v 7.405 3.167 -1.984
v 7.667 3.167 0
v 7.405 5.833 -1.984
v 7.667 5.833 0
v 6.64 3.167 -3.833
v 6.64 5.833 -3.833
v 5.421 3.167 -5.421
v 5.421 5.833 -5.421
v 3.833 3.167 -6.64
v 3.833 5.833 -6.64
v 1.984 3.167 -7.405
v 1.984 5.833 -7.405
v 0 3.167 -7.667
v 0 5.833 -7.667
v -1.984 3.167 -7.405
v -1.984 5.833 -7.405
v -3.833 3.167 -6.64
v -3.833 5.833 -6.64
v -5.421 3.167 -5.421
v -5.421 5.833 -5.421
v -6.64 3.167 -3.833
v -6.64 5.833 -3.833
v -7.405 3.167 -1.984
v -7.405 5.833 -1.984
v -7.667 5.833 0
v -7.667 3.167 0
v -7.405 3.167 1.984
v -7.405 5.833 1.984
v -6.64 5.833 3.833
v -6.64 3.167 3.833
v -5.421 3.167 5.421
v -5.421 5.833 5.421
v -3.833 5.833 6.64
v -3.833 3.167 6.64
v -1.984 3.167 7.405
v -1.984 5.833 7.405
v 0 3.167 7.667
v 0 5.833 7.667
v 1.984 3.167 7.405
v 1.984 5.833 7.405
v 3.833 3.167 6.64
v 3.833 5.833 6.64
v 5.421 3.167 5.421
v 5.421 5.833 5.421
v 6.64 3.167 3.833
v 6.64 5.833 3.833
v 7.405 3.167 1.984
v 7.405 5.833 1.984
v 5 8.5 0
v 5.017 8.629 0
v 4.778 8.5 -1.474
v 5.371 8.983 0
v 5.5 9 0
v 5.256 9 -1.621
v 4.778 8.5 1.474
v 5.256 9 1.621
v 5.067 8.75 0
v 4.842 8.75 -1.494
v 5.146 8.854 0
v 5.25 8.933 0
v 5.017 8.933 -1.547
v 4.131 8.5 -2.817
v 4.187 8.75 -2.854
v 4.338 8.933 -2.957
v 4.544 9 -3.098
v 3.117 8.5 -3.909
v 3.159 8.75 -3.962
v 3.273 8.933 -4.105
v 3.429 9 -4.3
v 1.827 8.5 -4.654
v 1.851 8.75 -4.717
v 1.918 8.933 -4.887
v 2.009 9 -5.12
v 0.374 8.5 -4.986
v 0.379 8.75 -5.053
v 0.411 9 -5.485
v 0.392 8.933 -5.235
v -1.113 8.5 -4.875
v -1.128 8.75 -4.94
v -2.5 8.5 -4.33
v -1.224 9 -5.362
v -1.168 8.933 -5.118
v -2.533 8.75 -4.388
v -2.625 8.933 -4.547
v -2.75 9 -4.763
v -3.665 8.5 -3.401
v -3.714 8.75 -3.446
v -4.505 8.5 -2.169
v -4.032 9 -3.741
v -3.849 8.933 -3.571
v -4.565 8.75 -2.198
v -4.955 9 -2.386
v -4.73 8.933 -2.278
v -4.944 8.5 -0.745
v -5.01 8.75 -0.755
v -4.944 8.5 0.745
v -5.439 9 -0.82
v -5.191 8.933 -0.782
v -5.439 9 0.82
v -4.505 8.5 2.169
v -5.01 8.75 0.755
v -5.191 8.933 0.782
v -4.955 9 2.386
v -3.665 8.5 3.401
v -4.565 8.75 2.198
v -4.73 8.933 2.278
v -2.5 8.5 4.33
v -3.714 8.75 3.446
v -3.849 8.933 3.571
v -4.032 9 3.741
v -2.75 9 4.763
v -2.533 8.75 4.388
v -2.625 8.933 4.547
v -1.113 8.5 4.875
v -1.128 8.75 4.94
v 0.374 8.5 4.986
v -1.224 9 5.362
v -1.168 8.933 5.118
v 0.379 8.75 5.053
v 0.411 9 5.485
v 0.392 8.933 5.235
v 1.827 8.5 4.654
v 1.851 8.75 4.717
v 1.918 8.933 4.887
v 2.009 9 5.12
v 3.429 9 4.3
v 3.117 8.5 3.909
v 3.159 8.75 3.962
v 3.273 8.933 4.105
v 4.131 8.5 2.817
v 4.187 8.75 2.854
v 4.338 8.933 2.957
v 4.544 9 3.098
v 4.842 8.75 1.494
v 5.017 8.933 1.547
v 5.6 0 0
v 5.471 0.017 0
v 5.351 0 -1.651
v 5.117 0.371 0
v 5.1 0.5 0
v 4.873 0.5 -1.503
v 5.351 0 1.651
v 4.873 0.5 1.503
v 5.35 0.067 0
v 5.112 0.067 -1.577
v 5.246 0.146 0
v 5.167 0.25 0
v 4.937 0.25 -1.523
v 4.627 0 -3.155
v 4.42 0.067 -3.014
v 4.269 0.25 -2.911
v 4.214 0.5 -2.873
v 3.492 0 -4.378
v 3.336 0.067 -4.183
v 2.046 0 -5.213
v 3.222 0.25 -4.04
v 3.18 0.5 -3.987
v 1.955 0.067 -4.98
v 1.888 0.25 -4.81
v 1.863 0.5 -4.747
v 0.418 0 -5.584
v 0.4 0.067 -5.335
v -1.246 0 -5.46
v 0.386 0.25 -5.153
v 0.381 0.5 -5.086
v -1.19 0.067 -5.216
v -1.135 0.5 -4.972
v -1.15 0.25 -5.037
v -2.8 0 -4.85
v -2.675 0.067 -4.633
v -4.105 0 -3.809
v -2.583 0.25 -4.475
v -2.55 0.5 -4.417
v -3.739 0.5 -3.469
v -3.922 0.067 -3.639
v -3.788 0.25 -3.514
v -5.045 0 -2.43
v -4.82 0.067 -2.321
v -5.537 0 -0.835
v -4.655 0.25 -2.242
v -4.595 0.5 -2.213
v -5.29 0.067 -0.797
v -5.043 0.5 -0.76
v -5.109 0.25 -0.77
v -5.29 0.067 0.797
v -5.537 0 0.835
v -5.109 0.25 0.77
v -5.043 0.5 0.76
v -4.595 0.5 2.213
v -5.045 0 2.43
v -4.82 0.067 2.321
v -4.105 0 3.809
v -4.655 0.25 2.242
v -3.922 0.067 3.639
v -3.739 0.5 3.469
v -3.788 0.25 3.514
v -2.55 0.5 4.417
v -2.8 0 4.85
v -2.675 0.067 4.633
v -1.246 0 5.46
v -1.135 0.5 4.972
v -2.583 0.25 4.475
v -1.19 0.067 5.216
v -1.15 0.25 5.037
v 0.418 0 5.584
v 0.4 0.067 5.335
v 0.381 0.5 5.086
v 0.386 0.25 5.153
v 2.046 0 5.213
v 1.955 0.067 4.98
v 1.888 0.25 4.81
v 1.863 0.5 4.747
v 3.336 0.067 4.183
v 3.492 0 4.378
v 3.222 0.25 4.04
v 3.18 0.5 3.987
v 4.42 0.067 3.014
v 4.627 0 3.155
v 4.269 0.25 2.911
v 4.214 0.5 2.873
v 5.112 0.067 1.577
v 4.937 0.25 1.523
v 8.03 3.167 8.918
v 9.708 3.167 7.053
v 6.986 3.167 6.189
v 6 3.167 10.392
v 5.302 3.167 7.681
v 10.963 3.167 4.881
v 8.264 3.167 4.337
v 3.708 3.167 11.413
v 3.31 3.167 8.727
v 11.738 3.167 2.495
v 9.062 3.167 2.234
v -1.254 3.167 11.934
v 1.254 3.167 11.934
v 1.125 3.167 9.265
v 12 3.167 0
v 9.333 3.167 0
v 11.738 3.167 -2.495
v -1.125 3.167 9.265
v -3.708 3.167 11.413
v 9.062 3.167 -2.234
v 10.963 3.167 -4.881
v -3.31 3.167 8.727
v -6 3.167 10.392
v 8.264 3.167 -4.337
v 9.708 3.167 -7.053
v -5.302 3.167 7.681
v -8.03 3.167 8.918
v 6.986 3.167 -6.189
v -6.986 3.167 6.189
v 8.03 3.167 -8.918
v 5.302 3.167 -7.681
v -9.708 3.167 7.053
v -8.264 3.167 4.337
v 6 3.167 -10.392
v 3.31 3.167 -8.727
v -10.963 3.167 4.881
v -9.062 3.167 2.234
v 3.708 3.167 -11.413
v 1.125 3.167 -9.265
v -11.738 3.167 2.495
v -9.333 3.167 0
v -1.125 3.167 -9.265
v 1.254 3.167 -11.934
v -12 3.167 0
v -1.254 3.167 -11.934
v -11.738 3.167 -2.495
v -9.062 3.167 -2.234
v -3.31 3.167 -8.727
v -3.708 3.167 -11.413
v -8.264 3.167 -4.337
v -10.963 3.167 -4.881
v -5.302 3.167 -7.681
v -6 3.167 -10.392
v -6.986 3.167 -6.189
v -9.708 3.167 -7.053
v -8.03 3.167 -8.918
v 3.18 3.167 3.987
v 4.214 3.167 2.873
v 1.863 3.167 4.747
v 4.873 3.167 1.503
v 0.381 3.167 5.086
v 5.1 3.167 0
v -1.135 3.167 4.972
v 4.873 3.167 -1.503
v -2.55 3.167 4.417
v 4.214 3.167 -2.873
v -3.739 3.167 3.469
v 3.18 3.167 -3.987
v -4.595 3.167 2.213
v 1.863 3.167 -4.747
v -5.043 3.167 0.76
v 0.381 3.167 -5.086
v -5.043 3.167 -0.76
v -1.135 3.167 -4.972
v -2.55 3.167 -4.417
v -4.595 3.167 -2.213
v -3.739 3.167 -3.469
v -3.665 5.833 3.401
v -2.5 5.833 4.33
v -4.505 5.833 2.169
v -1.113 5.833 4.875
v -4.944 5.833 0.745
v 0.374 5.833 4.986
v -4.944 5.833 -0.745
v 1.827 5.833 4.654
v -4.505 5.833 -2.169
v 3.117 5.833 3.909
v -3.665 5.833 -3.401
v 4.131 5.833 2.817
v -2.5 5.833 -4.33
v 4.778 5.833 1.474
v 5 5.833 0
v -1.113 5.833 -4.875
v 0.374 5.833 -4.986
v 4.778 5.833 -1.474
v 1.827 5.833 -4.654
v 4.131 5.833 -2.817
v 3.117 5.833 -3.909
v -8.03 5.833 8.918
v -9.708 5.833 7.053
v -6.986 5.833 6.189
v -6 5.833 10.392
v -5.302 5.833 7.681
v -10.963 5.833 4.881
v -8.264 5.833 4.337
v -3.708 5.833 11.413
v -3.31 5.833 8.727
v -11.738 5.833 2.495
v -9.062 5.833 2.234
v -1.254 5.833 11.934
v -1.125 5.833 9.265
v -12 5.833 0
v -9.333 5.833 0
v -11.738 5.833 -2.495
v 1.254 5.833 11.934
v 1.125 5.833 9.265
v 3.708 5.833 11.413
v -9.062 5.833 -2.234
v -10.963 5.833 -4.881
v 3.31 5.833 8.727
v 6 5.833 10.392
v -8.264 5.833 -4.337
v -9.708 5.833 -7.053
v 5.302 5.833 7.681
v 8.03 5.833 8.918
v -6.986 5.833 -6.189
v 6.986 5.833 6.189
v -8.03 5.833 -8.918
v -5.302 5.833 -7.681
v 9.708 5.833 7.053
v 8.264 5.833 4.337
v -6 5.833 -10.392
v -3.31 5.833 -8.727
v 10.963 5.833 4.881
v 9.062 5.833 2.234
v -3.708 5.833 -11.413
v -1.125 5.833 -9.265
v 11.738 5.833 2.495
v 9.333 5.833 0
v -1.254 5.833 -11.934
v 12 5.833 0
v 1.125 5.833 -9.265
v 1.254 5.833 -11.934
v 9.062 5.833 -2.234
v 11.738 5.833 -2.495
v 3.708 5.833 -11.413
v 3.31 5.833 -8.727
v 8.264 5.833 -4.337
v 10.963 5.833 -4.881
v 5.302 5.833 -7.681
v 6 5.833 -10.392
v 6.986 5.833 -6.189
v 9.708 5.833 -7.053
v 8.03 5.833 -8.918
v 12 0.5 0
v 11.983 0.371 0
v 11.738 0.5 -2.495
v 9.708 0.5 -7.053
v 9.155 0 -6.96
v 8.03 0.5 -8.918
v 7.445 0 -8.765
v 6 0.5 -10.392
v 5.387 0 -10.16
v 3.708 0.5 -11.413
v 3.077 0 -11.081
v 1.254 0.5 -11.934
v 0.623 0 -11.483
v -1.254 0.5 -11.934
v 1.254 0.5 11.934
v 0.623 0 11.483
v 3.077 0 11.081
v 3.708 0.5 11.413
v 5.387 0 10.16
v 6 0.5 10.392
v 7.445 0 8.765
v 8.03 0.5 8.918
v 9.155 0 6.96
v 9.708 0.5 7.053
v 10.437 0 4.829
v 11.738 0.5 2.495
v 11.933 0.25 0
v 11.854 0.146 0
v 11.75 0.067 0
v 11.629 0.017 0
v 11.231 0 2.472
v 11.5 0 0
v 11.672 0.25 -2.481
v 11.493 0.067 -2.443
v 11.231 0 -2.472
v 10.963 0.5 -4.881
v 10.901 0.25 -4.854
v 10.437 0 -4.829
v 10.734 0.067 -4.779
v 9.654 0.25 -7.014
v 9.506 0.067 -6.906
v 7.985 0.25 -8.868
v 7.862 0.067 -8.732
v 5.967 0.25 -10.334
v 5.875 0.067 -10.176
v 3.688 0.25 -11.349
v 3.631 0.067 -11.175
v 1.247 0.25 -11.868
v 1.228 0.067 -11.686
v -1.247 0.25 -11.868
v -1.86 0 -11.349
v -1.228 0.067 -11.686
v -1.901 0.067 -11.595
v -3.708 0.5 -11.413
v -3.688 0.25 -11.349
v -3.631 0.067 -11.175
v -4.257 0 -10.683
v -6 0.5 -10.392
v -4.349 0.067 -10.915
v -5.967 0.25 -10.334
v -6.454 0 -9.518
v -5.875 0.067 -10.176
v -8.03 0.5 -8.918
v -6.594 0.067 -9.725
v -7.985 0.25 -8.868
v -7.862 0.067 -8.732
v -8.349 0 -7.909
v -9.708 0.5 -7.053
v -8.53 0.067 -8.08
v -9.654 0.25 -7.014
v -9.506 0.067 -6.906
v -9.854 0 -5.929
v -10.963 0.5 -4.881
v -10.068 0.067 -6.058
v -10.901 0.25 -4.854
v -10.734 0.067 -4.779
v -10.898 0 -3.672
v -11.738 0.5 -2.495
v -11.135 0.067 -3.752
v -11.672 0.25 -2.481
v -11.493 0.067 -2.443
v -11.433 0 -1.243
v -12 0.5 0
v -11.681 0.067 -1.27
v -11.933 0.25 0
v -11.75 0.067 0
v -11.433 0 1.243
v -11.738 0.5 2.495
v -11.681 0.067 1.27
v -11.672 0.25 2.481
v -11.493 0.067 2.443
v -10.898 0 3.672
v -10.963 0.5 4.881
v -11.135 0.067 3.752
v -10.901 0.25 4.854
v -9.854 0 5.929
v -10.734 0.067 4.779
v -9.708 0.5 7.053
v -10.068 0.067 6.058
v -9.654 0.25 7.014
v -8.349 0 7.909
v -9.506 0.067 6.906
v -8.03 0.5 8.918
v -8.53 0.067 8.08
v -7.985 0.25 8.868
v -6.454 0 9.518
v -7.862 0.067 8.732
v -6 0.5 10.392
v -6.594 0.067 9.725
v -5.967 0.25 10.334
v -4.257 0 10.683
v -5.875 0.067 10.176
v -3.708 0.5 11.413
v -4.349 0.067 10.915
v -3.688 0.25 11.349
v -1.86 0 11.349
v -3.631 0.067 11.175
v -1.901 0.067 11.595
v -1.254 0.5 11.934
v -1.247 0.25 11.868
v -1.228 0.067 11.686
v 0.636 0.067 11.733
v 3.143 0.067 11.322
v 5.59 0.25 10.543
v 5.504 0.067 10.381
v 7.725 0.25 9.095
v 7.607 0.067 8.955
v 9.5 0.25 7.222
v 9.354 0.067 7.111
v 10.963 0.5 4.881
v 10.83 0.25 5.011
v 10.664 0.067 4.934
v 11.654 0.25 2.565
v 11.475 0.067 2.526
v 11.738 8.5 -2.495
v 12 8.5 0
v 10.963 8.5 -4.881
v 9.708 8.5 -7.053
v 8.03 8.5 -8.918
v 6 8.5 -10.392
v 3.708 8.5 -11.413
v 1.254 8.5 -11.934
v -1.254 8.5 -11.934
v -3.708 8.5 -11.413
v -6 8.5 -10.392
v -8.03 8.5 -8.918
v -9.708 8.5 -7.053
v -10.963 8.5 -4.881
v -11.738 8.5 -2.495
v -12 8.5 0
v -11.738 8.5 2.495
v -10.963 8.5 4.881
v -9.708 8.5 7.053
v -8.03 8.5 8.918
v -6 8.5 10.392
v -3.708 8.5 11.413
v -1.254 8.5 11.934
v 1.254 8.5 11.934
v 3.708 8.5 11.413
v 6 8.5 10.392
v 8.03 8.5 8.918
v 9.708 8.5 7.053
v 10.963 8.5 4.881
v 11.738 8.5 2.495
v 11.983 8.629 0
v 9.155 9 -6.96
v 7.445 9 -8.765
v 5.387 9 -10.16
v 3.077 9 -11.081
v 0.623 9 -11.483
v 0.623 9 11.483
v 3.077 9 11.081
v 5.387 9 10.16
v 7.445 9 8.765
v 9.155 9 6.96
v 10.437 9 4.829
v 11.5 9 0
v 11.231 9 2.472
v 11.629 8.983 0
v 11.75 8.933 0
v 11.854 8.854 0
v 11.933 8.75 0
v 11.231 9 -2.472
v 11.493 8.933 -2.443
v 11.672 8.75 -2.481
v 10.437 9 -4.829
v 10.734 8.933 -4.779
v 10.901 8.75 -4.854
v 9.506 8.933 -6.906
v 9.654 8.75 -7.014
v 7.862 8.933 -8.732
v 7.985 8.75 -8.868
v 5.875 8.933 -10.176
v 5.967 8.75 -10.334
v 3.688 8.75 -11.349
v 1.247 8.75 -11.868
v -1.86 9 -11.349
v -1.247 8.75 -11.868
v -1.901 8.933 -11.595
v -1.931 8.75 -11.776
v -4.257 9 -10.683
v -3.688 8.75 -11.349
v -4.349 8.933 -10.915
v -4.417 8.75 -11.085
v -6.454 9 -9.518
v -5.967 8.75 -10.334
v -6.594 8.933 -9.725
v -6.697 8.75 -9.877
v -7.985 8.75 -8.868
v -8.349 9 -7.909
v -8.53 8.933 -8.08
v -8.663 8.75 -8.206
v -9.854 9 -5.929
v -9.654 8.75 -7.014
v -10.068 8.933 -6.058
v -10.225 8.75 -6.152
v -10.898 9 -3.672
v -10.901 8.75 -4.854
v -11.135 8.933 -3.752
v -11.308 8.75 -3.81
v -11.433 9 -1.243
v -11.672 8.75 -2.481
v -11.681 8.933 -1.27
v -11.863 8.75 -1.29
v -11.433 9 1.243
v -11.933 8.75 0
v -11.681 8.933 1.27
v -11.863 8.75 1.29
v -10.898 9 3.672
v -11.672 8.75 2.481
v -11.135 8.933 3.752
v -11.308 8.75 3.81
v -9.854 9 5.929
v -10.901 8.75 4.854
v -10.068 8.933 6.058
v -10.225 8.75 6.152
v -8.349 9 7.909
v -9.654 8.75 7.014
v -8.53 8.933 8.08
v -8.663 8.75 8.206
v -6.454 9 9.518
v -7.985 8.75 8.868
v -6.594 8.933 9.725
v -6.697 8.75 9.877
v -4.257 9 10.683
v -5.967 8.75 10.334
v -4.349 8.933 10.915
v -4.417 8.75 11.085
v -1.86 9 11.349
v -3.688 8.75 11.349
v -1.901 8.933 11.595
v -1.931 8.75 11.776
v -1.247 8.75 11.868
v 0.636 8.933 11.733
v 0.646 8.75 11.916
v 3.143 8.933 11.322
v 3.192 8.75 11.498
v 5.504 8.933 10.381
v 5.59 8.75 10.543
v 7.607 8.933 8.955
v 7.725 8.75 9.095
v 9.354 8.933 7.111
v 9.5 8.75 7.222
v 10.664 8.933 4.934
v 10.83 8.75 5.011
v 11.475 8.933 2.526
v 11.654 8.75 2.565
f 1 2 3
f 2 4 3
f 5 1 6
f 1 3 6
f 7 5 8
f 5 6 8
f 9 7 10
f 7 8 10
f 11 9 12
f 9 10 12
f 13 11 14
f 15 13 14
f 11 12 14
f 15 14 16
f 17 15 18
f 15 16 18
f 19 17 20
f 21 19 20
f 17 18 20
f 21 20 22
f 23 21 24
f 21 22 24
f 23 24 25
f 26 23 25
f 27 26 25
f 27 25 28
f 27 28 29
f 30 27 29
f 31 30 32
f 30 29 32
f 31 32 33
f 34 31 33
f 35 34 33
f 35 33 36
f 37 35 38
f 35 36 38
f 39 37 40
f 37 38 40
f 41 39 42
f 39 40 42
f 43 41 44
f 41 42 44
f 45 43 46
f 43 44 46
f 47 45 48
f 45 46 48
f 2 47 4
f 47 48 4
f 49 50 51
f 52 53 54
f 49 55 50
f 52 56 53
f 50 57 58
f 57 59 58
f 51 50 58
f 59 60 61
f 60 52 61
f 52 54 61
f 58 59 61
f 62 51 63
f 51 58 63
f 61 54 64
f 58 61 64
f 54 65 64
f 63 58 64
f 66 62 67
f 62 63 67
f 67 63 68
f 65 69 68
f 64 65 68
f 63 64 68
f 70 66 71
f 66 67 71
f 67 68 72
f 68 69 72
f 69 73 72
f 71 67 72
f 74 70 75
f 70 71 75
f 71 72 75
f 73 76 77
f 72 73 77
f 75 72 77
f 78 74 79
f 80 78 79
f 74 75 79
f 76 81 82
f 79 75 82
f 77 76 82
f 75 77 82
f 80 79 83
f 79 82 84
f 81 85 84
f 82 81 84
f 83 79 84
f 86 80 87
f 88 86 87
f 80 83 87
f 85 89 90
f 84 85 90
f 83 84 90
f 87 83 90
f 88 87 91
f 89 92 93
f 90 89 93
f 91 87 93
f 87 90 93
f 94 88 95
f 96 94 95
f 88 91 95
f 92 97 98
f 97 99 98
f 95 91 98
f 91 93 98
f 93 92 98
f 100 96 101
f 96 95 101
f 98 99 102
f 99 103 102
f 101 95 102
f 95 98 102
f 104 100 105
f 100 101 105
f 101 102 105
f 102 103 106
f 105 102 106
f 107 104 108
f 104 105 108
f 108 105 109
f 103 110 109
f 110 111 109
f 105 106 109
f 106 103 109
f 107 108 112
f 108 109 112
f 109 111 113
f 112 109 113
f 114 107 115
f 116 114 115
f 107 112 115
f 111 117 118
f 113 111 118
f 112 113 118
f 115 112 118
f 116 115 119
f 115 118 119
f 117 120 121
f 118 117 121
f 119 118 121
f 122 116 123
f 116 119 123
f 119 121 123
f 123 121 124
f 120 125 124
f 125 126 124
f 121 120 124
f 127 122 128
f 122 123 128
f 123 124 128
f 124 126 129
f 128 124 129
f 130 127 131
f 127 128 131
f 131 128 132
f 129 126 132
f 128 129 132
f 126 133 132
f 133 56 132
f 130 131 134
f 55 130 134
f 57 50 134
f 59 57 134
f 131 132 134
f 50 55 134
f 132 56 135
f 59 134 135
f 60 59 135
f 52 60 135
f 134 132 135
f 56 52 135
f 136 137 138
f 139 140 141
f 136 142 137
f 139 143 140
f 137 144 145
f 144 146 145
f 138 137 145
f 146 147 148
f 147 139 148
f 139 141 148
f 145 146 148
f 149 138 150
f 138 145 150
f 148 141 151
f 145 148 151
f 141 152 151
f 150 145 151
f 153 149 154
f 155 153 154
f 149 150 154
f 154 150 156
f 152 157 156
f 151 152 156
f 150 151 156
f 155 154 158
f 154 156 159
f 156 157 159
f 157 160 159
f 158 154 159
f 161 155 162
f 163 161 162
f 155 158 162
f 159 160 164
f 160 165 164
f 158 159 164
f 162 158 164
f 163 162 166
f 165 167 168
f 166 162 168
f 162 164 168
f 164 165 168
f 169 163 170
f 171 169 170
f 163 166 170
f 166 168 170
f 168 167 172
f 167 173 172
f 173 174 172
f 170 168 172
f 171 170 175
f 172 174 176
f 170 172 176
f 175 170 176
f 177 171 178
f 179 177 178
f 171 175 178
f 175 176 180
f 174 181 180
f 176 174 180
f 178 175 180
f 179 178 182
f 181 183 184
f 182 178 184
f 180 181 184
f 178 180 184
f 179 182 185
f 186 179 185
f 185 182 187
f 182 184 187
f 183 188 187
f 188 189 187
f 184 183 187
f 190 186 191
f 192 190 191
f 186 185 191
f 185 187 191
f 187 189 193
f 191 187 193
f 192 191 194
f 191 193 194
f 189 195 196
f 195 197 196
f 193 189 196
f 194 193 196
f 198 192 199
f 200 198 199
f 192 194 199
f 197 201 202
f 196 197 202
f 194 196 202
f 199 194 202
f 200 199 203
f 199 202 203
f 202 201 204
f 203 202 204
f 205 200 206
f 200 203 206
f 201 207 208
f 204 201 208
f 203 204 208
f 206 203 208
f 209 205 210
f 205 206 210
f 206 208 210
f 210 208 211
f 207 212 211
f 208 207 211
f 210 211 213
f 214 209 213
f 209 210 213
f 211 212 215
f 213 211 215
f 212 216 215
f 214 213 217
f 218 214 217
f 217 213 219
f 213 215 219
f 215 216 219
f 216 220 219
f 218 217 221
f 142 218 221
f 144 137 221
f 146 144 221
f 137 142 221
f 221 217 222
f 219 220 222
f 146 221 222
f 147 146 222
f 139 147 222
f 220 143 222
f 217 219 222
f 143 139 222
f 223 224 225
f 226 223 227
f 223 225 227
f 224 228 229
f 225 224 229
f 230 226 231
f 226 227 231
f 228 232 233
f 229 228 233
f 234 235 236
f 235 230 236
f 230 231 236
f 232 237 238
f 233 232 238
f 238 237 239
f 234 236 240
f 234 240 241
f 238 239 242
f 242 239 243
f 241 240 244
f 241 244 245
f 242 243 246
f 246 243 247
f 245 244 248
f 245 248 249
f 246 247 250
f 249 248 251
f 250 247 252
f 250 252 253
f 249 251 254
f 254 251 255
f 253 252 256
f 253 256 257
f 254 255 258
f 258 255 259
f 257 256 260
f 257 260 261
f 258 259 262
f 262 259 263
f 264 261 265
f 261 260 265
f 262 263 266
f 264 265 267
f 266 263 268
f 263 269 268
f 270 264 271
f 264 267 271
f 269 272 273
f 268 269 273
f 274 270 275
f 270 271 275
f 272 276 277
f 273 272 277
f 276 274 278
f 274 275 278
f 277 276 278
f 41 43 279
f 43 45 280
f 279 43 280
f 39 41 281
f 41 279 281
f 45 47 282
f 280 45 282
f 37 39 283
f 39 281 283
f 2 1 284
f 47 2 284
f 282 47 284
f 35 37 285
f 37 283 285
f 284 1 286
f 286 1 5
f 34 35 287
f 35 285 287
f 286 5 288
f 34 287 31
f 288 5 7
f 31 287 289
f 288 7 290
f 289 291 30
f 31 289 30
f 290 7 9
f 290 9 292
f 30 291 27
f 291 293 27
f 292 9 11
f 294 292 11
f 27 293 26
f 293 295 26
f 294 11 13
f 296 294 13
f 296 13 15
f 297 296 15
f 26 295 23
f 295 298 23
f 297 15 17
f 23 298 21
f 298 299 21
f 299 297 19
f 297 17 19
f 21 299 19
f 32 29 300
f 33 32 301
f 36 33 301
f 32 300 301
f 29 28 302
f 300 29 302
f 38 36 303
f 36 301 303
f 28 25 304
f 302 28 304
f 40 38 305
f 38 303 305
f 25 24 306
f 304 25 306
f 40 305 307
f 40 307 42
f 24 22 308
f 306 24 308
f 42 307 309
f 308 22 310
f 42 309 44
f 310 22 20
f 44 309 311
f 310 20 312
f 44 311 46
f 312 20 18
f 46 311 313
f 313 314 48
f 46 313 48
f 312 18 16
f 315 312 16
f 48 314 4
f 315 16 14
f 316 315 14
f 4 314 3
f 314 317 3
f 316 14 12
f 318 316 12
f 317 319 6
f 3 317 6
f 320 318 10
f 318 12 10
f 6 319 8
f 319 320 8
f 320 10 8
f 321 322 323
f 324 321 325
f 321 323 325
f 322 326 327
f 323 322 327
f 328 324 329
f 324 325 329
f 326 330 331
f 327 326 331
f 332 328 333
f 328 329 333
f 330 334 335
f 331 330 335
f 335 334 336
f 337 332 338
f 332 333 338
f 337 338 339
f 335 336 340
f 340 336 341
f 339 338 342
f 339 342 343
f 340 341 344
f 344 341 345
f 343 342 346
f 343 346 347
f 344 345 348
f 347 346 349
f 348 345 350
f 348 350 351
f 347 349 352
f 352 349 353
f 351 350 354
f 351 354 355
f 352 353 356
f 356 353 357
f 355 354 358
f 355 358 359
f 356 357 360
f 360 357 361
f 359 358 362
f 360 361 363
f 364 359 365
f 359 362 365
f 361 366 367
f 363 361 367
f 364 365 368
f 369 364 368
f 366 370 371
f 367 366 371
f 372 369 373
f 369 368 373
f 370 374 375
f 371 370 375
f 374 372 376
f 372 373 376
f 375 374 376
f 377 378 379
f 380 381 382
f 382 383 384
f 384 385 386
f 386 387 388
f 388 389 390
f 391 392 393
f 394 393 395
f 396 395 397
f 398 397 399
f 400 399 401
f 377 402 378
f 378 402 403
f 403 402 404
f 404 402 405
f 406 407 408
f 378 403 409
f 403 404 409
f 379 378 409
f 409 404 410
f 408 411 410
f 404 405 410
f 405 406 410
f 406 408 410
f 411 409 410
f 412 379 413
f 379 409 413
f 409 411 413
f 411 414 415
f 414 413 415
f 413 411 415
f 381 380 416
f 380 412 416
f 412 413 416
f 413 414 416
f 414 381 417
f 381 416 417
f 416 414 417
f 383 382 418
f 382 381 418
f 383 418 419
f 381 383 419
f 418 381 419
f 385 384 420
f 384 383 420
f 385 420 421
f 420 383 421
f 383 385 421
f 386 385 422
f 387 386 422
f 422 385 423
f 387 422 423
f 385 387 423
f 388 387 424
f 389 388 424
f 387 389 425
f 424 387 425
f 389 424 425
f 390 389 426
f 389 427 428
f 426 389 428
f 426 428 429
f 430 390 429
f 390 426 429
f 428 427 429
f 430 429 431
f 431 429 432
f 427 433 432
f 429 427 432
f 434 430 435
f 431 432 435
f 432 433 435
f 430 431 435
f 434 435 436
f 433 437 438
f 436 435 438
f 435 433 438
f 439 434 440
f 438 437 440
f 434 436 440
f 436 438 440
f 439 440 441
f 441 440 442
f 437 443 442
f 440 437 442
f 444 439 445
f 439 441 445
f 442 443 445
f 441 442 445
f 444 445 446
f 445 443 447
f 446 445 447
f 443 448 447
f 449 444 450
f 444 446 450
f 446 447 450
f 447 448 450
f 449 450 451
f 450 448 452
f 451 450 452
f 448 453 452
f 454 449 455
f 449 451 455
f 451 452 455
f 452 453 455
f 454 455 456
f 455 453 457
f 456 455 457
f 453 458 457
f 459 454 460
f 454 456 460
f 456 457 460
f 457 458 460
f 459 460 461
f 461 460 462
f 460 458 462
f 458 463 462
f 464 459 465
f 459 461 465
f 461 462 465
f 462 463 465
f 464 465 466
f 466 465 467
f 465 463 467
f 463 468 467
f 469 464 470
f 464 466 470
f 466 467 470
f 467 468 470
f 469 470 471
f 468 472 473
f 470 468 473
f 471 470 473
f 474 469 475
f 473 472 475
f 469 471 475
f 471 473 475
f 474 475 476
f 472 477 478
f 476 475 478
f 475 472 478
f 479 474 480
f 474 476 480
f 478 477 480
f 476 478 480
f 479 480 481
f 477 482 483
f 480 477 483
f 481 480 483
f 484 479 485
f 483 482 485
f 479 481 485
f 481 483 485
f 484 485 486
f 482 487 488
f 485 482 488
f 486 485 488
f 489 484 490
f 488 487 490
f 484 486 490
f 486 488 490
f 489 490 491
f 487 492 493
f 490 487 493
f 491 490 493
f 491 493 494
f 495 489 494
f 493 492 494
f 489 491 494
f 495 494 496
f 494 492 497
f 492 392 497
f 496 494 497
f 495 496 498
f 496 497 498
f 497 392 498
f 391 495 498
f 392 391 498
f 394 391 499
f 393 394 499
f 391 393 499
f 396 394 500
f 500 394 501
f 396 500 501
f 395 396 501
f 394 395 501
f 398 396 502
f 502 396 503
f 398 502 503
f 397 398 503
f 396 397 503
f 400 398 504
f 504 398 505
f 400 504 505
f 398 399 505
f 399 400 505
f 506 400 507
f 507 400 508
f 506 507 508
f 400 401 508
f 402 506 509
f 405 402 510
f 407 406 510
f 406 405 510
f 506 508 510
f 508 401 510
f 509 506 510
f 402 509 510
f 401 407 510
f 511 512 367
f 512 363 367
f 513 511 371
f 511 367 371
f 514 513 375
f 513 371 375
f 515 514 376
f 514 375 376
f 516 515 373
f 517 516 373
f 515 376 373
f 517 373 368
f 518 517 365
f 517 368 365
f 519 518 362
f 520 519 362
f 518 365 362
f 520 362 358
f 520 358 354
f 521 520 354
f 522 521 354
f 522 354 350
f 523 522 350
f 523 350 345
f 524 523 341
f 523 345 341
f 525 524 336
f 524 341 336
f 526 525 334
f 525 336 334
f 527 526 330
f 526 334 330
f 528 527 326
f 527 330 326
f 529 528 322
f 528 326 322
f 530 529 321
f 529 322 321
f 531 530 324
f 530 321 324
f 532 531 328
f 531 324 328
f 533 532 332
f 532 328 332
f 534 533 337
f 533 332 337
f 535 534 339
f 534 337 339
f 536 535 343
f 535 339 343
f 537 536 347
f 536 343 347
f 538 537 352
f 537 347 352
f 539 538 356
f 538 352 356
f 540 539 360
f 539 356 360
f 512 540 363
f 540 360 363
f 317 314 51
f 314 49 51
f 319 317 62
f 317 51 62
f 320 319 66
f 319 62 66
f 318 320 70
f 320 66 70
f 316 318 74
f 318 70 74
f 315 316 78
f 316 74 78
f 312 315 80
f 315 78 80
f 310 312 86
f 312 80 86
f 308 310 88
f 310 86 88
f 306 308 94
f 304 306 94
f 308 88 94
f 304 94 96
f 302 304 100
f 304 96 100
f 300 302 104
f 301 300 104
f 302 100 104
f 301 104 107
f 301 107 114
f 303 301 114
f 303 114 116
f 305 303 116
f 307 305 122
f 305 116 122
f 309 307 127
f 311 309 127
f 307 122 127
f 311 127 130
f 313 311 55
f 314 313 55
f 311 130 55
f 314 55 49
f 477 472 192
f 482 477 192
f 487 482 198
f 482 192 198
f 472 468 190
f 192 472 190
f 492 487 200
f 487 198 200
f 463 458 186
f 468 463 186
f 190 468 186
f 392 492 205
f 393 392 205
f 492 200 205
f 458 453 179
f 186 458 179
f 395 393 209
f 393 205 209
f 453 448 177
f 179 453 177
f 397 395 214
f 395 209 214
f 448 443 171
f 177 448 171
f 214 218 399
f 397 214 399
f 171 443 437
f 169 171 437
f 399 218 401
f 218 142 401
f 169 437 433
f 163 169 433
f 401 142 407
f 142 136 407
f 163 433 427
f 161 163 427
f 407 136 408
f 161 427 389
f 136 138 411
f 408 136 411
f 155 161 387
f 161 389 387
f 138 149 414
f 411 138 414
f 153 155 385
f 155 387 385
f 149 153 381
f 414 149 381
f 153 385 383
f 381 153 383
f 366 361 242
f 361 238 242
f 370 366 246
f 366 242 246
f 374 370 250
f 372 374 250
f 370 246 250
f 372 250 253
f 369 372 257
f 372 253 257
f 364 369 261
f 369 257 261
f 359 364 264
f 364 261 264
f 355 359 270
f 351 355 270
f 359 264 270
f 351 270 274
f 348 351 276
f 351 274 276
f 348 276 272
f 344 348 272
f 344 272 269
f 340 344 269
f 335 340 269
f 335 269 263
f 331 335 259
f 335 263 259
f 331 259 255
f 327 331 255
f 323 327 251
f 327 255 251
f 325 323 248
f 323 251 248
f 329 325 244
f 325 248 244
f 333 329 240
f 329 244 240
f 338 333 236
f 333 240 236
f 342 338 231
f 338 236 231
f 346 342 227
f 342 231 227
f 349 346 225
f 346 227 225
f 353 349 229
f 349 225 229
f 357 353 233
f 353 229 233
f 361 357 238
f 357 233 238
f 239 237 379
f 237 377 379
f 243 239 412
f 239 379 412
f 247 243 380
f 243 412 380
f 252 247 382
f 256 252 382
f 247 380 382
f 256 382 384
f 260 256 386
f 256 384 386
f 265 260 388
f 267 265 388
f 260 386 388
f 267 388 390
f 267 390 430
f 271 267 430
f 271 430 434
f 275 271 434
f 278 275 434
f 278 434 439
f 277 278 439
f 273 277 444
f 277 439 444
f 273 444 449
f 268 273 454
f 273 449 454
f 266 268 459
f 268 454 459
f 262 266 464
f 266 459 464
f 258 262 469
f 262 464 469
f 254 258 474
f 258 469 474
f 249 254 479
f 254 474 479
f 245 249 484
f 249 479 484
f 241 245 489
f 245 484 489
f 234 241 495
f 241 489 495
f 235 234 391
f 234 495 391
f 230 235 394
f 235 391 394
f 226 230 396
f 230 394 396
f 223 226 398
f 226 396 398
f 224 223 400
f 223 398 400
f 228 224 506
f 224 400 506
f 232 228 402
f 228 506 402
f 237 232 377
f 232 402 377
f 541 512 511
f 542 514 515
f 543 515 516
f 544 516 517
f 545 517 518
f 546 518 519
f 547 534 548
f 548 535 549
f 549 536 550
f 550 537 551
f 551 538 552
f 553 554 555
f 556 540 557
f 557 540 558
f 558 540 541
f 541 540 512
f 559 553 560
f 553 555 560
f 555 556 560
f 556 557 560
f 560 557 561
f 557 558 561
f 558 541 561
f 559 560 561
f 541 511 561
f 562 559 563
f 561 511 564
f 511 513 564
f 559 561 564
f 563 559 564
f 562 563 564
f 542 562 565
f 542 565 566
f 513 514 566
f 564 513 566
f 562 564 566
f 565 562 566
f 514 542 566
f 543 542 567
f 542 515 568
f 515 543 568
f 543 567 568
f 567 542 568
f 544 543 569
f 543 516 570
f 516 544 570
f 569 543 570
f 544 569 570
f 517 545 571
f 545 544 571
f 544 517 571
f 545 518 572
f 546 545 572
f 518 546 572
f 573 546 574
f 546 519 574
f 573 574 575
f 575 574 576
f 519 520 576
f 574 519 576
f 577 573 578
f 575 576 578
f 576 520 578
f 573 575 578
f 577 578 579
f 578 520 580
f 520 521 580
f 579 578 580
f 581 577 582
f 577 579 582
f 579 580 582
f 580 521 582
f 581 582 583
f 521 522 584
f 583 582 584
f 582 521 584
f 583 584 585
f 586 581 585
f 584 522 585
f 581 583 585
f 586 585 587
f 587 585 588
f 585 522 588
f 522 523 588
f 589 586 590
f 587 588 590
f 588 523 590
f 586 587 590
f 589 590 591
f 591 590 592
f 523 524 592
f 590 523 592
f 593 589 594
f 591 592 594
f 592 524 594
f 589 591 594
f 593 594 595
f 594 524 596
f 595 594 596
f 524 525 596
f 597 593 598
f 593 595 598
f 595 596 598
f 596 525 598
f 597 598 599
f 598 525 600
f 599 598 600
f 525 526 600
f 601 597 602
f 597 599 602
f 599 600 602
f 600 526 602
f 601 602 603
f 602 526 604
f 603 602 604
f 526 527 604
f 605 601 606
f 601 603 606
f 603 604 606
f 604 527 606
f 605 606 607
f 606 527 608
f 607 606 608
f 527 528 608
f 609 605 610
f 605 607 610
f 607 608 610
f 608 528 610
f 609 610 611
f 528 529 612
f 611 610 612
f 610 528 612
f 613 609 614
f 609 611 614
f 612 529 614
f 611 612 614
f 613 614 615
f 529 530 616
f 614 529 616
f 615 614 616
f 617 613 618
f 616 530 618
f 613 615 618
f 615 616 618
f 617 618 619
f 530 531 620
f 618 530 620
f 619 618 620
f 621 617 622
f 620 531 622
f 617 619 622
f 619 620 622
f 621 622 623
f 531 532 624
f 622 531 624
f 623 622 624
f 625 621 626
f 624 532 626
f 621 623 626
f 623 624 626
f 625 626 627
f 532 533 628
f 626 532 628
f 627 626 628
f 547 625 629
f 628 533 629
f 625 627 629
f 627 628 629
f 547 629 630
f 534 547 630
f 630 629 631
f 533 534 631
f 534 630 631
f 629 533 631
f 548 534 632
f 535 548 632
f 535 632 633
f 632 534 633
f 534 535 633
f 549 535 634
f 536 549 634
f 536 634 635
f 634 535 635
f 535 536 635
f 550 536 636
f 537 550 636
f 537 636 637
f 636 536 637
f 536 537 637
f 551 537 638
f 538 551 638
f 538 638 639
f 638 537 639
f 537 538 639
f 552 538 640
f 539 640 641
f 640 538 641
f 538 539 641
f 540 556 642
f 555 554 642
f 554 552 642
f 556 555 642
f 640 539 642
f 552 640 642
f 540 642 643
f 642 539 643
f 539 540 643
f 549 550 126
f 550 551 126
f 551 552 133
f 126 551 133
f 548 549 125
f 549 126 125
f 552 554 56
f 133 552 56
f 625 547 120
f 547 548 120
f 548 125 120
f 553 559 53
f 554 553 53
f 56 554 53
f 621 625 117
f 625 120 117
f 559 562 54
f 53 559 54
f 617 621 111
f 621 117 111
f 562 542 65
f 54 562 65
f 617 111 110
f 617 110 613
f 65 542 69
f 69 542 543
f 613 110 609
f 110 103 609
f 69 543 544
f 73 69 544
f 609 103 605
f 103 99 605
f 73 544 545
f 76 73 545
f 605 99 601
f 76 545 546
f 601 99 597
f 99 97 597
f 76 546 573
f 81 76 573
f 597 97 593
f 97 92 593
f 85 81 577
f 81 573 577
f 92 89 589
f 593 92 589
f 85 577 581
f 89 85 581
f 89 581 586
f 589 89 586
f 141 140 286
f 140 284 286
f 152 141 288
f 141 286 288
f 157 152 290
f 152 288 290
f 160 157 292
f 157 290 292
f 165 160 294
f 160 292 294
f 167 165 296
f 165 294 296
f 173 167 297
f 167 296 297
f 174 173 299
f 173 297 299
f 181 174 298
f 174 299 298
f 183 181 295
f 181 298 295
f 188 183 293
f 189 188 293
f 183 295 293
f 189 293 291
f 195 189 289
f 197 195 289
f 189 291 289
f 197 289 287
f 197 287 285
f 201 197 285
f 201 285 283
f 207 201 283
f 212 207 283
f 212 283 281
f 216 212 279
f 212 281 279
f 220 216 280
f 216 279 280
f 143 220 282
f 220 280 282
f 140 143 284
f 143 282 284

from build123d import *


with BuildPart() as part:
    # Эскиз1 → Повернуть1 (revolve)
    with BuildSketch(Plane.XY):
        with BuildLine():
            Line((5.1, 3.166666667), (7.666666667, 3.166666667))
            Line((7.666666667, 3.166666667), (7.666666667, 5.833333333))
            Line((7.666666667, 5.833333333), (5, 5.833333333))
            Line((5, 5.833333333), (5, 8.5))
            ThreePointArc((5, 8.5), (5.146446609, 8.853553391), (5.5, 9))
            Line((5.5, 9), (11.5, 9))
            ThreePointArc((11.5, 9), (11.853553391, 8.853553391), (12, 8.5))
            Line((12, 8.5), (12, 5.833333333))
            Line((12, 5.833333333), (9.333333333, 5.833333333))
            Line((9.333333333, 5.833333333), (9.333333333, 3.166666667))
            Line((9.333333333, 3.166666667), (12, 3.166666667))
            Line((12, 3.166666667), (12, 0.5))
            ThreePointArc((12, 0.5), (11.853553391, 0.146446609), (11.5, 0))
            Line((11.5, 0), (5.6, 0))
            ThreePointArc((5.6, 0), (5.246446609, 0.146446609), (5.1, 0.5))
            Line((5.1, 0.5), (5.1, 3.166666667))
        make_face()
    revolve(axis=Axis((0, -1000, 0), (0, 1, 0)))


solid = part.part
